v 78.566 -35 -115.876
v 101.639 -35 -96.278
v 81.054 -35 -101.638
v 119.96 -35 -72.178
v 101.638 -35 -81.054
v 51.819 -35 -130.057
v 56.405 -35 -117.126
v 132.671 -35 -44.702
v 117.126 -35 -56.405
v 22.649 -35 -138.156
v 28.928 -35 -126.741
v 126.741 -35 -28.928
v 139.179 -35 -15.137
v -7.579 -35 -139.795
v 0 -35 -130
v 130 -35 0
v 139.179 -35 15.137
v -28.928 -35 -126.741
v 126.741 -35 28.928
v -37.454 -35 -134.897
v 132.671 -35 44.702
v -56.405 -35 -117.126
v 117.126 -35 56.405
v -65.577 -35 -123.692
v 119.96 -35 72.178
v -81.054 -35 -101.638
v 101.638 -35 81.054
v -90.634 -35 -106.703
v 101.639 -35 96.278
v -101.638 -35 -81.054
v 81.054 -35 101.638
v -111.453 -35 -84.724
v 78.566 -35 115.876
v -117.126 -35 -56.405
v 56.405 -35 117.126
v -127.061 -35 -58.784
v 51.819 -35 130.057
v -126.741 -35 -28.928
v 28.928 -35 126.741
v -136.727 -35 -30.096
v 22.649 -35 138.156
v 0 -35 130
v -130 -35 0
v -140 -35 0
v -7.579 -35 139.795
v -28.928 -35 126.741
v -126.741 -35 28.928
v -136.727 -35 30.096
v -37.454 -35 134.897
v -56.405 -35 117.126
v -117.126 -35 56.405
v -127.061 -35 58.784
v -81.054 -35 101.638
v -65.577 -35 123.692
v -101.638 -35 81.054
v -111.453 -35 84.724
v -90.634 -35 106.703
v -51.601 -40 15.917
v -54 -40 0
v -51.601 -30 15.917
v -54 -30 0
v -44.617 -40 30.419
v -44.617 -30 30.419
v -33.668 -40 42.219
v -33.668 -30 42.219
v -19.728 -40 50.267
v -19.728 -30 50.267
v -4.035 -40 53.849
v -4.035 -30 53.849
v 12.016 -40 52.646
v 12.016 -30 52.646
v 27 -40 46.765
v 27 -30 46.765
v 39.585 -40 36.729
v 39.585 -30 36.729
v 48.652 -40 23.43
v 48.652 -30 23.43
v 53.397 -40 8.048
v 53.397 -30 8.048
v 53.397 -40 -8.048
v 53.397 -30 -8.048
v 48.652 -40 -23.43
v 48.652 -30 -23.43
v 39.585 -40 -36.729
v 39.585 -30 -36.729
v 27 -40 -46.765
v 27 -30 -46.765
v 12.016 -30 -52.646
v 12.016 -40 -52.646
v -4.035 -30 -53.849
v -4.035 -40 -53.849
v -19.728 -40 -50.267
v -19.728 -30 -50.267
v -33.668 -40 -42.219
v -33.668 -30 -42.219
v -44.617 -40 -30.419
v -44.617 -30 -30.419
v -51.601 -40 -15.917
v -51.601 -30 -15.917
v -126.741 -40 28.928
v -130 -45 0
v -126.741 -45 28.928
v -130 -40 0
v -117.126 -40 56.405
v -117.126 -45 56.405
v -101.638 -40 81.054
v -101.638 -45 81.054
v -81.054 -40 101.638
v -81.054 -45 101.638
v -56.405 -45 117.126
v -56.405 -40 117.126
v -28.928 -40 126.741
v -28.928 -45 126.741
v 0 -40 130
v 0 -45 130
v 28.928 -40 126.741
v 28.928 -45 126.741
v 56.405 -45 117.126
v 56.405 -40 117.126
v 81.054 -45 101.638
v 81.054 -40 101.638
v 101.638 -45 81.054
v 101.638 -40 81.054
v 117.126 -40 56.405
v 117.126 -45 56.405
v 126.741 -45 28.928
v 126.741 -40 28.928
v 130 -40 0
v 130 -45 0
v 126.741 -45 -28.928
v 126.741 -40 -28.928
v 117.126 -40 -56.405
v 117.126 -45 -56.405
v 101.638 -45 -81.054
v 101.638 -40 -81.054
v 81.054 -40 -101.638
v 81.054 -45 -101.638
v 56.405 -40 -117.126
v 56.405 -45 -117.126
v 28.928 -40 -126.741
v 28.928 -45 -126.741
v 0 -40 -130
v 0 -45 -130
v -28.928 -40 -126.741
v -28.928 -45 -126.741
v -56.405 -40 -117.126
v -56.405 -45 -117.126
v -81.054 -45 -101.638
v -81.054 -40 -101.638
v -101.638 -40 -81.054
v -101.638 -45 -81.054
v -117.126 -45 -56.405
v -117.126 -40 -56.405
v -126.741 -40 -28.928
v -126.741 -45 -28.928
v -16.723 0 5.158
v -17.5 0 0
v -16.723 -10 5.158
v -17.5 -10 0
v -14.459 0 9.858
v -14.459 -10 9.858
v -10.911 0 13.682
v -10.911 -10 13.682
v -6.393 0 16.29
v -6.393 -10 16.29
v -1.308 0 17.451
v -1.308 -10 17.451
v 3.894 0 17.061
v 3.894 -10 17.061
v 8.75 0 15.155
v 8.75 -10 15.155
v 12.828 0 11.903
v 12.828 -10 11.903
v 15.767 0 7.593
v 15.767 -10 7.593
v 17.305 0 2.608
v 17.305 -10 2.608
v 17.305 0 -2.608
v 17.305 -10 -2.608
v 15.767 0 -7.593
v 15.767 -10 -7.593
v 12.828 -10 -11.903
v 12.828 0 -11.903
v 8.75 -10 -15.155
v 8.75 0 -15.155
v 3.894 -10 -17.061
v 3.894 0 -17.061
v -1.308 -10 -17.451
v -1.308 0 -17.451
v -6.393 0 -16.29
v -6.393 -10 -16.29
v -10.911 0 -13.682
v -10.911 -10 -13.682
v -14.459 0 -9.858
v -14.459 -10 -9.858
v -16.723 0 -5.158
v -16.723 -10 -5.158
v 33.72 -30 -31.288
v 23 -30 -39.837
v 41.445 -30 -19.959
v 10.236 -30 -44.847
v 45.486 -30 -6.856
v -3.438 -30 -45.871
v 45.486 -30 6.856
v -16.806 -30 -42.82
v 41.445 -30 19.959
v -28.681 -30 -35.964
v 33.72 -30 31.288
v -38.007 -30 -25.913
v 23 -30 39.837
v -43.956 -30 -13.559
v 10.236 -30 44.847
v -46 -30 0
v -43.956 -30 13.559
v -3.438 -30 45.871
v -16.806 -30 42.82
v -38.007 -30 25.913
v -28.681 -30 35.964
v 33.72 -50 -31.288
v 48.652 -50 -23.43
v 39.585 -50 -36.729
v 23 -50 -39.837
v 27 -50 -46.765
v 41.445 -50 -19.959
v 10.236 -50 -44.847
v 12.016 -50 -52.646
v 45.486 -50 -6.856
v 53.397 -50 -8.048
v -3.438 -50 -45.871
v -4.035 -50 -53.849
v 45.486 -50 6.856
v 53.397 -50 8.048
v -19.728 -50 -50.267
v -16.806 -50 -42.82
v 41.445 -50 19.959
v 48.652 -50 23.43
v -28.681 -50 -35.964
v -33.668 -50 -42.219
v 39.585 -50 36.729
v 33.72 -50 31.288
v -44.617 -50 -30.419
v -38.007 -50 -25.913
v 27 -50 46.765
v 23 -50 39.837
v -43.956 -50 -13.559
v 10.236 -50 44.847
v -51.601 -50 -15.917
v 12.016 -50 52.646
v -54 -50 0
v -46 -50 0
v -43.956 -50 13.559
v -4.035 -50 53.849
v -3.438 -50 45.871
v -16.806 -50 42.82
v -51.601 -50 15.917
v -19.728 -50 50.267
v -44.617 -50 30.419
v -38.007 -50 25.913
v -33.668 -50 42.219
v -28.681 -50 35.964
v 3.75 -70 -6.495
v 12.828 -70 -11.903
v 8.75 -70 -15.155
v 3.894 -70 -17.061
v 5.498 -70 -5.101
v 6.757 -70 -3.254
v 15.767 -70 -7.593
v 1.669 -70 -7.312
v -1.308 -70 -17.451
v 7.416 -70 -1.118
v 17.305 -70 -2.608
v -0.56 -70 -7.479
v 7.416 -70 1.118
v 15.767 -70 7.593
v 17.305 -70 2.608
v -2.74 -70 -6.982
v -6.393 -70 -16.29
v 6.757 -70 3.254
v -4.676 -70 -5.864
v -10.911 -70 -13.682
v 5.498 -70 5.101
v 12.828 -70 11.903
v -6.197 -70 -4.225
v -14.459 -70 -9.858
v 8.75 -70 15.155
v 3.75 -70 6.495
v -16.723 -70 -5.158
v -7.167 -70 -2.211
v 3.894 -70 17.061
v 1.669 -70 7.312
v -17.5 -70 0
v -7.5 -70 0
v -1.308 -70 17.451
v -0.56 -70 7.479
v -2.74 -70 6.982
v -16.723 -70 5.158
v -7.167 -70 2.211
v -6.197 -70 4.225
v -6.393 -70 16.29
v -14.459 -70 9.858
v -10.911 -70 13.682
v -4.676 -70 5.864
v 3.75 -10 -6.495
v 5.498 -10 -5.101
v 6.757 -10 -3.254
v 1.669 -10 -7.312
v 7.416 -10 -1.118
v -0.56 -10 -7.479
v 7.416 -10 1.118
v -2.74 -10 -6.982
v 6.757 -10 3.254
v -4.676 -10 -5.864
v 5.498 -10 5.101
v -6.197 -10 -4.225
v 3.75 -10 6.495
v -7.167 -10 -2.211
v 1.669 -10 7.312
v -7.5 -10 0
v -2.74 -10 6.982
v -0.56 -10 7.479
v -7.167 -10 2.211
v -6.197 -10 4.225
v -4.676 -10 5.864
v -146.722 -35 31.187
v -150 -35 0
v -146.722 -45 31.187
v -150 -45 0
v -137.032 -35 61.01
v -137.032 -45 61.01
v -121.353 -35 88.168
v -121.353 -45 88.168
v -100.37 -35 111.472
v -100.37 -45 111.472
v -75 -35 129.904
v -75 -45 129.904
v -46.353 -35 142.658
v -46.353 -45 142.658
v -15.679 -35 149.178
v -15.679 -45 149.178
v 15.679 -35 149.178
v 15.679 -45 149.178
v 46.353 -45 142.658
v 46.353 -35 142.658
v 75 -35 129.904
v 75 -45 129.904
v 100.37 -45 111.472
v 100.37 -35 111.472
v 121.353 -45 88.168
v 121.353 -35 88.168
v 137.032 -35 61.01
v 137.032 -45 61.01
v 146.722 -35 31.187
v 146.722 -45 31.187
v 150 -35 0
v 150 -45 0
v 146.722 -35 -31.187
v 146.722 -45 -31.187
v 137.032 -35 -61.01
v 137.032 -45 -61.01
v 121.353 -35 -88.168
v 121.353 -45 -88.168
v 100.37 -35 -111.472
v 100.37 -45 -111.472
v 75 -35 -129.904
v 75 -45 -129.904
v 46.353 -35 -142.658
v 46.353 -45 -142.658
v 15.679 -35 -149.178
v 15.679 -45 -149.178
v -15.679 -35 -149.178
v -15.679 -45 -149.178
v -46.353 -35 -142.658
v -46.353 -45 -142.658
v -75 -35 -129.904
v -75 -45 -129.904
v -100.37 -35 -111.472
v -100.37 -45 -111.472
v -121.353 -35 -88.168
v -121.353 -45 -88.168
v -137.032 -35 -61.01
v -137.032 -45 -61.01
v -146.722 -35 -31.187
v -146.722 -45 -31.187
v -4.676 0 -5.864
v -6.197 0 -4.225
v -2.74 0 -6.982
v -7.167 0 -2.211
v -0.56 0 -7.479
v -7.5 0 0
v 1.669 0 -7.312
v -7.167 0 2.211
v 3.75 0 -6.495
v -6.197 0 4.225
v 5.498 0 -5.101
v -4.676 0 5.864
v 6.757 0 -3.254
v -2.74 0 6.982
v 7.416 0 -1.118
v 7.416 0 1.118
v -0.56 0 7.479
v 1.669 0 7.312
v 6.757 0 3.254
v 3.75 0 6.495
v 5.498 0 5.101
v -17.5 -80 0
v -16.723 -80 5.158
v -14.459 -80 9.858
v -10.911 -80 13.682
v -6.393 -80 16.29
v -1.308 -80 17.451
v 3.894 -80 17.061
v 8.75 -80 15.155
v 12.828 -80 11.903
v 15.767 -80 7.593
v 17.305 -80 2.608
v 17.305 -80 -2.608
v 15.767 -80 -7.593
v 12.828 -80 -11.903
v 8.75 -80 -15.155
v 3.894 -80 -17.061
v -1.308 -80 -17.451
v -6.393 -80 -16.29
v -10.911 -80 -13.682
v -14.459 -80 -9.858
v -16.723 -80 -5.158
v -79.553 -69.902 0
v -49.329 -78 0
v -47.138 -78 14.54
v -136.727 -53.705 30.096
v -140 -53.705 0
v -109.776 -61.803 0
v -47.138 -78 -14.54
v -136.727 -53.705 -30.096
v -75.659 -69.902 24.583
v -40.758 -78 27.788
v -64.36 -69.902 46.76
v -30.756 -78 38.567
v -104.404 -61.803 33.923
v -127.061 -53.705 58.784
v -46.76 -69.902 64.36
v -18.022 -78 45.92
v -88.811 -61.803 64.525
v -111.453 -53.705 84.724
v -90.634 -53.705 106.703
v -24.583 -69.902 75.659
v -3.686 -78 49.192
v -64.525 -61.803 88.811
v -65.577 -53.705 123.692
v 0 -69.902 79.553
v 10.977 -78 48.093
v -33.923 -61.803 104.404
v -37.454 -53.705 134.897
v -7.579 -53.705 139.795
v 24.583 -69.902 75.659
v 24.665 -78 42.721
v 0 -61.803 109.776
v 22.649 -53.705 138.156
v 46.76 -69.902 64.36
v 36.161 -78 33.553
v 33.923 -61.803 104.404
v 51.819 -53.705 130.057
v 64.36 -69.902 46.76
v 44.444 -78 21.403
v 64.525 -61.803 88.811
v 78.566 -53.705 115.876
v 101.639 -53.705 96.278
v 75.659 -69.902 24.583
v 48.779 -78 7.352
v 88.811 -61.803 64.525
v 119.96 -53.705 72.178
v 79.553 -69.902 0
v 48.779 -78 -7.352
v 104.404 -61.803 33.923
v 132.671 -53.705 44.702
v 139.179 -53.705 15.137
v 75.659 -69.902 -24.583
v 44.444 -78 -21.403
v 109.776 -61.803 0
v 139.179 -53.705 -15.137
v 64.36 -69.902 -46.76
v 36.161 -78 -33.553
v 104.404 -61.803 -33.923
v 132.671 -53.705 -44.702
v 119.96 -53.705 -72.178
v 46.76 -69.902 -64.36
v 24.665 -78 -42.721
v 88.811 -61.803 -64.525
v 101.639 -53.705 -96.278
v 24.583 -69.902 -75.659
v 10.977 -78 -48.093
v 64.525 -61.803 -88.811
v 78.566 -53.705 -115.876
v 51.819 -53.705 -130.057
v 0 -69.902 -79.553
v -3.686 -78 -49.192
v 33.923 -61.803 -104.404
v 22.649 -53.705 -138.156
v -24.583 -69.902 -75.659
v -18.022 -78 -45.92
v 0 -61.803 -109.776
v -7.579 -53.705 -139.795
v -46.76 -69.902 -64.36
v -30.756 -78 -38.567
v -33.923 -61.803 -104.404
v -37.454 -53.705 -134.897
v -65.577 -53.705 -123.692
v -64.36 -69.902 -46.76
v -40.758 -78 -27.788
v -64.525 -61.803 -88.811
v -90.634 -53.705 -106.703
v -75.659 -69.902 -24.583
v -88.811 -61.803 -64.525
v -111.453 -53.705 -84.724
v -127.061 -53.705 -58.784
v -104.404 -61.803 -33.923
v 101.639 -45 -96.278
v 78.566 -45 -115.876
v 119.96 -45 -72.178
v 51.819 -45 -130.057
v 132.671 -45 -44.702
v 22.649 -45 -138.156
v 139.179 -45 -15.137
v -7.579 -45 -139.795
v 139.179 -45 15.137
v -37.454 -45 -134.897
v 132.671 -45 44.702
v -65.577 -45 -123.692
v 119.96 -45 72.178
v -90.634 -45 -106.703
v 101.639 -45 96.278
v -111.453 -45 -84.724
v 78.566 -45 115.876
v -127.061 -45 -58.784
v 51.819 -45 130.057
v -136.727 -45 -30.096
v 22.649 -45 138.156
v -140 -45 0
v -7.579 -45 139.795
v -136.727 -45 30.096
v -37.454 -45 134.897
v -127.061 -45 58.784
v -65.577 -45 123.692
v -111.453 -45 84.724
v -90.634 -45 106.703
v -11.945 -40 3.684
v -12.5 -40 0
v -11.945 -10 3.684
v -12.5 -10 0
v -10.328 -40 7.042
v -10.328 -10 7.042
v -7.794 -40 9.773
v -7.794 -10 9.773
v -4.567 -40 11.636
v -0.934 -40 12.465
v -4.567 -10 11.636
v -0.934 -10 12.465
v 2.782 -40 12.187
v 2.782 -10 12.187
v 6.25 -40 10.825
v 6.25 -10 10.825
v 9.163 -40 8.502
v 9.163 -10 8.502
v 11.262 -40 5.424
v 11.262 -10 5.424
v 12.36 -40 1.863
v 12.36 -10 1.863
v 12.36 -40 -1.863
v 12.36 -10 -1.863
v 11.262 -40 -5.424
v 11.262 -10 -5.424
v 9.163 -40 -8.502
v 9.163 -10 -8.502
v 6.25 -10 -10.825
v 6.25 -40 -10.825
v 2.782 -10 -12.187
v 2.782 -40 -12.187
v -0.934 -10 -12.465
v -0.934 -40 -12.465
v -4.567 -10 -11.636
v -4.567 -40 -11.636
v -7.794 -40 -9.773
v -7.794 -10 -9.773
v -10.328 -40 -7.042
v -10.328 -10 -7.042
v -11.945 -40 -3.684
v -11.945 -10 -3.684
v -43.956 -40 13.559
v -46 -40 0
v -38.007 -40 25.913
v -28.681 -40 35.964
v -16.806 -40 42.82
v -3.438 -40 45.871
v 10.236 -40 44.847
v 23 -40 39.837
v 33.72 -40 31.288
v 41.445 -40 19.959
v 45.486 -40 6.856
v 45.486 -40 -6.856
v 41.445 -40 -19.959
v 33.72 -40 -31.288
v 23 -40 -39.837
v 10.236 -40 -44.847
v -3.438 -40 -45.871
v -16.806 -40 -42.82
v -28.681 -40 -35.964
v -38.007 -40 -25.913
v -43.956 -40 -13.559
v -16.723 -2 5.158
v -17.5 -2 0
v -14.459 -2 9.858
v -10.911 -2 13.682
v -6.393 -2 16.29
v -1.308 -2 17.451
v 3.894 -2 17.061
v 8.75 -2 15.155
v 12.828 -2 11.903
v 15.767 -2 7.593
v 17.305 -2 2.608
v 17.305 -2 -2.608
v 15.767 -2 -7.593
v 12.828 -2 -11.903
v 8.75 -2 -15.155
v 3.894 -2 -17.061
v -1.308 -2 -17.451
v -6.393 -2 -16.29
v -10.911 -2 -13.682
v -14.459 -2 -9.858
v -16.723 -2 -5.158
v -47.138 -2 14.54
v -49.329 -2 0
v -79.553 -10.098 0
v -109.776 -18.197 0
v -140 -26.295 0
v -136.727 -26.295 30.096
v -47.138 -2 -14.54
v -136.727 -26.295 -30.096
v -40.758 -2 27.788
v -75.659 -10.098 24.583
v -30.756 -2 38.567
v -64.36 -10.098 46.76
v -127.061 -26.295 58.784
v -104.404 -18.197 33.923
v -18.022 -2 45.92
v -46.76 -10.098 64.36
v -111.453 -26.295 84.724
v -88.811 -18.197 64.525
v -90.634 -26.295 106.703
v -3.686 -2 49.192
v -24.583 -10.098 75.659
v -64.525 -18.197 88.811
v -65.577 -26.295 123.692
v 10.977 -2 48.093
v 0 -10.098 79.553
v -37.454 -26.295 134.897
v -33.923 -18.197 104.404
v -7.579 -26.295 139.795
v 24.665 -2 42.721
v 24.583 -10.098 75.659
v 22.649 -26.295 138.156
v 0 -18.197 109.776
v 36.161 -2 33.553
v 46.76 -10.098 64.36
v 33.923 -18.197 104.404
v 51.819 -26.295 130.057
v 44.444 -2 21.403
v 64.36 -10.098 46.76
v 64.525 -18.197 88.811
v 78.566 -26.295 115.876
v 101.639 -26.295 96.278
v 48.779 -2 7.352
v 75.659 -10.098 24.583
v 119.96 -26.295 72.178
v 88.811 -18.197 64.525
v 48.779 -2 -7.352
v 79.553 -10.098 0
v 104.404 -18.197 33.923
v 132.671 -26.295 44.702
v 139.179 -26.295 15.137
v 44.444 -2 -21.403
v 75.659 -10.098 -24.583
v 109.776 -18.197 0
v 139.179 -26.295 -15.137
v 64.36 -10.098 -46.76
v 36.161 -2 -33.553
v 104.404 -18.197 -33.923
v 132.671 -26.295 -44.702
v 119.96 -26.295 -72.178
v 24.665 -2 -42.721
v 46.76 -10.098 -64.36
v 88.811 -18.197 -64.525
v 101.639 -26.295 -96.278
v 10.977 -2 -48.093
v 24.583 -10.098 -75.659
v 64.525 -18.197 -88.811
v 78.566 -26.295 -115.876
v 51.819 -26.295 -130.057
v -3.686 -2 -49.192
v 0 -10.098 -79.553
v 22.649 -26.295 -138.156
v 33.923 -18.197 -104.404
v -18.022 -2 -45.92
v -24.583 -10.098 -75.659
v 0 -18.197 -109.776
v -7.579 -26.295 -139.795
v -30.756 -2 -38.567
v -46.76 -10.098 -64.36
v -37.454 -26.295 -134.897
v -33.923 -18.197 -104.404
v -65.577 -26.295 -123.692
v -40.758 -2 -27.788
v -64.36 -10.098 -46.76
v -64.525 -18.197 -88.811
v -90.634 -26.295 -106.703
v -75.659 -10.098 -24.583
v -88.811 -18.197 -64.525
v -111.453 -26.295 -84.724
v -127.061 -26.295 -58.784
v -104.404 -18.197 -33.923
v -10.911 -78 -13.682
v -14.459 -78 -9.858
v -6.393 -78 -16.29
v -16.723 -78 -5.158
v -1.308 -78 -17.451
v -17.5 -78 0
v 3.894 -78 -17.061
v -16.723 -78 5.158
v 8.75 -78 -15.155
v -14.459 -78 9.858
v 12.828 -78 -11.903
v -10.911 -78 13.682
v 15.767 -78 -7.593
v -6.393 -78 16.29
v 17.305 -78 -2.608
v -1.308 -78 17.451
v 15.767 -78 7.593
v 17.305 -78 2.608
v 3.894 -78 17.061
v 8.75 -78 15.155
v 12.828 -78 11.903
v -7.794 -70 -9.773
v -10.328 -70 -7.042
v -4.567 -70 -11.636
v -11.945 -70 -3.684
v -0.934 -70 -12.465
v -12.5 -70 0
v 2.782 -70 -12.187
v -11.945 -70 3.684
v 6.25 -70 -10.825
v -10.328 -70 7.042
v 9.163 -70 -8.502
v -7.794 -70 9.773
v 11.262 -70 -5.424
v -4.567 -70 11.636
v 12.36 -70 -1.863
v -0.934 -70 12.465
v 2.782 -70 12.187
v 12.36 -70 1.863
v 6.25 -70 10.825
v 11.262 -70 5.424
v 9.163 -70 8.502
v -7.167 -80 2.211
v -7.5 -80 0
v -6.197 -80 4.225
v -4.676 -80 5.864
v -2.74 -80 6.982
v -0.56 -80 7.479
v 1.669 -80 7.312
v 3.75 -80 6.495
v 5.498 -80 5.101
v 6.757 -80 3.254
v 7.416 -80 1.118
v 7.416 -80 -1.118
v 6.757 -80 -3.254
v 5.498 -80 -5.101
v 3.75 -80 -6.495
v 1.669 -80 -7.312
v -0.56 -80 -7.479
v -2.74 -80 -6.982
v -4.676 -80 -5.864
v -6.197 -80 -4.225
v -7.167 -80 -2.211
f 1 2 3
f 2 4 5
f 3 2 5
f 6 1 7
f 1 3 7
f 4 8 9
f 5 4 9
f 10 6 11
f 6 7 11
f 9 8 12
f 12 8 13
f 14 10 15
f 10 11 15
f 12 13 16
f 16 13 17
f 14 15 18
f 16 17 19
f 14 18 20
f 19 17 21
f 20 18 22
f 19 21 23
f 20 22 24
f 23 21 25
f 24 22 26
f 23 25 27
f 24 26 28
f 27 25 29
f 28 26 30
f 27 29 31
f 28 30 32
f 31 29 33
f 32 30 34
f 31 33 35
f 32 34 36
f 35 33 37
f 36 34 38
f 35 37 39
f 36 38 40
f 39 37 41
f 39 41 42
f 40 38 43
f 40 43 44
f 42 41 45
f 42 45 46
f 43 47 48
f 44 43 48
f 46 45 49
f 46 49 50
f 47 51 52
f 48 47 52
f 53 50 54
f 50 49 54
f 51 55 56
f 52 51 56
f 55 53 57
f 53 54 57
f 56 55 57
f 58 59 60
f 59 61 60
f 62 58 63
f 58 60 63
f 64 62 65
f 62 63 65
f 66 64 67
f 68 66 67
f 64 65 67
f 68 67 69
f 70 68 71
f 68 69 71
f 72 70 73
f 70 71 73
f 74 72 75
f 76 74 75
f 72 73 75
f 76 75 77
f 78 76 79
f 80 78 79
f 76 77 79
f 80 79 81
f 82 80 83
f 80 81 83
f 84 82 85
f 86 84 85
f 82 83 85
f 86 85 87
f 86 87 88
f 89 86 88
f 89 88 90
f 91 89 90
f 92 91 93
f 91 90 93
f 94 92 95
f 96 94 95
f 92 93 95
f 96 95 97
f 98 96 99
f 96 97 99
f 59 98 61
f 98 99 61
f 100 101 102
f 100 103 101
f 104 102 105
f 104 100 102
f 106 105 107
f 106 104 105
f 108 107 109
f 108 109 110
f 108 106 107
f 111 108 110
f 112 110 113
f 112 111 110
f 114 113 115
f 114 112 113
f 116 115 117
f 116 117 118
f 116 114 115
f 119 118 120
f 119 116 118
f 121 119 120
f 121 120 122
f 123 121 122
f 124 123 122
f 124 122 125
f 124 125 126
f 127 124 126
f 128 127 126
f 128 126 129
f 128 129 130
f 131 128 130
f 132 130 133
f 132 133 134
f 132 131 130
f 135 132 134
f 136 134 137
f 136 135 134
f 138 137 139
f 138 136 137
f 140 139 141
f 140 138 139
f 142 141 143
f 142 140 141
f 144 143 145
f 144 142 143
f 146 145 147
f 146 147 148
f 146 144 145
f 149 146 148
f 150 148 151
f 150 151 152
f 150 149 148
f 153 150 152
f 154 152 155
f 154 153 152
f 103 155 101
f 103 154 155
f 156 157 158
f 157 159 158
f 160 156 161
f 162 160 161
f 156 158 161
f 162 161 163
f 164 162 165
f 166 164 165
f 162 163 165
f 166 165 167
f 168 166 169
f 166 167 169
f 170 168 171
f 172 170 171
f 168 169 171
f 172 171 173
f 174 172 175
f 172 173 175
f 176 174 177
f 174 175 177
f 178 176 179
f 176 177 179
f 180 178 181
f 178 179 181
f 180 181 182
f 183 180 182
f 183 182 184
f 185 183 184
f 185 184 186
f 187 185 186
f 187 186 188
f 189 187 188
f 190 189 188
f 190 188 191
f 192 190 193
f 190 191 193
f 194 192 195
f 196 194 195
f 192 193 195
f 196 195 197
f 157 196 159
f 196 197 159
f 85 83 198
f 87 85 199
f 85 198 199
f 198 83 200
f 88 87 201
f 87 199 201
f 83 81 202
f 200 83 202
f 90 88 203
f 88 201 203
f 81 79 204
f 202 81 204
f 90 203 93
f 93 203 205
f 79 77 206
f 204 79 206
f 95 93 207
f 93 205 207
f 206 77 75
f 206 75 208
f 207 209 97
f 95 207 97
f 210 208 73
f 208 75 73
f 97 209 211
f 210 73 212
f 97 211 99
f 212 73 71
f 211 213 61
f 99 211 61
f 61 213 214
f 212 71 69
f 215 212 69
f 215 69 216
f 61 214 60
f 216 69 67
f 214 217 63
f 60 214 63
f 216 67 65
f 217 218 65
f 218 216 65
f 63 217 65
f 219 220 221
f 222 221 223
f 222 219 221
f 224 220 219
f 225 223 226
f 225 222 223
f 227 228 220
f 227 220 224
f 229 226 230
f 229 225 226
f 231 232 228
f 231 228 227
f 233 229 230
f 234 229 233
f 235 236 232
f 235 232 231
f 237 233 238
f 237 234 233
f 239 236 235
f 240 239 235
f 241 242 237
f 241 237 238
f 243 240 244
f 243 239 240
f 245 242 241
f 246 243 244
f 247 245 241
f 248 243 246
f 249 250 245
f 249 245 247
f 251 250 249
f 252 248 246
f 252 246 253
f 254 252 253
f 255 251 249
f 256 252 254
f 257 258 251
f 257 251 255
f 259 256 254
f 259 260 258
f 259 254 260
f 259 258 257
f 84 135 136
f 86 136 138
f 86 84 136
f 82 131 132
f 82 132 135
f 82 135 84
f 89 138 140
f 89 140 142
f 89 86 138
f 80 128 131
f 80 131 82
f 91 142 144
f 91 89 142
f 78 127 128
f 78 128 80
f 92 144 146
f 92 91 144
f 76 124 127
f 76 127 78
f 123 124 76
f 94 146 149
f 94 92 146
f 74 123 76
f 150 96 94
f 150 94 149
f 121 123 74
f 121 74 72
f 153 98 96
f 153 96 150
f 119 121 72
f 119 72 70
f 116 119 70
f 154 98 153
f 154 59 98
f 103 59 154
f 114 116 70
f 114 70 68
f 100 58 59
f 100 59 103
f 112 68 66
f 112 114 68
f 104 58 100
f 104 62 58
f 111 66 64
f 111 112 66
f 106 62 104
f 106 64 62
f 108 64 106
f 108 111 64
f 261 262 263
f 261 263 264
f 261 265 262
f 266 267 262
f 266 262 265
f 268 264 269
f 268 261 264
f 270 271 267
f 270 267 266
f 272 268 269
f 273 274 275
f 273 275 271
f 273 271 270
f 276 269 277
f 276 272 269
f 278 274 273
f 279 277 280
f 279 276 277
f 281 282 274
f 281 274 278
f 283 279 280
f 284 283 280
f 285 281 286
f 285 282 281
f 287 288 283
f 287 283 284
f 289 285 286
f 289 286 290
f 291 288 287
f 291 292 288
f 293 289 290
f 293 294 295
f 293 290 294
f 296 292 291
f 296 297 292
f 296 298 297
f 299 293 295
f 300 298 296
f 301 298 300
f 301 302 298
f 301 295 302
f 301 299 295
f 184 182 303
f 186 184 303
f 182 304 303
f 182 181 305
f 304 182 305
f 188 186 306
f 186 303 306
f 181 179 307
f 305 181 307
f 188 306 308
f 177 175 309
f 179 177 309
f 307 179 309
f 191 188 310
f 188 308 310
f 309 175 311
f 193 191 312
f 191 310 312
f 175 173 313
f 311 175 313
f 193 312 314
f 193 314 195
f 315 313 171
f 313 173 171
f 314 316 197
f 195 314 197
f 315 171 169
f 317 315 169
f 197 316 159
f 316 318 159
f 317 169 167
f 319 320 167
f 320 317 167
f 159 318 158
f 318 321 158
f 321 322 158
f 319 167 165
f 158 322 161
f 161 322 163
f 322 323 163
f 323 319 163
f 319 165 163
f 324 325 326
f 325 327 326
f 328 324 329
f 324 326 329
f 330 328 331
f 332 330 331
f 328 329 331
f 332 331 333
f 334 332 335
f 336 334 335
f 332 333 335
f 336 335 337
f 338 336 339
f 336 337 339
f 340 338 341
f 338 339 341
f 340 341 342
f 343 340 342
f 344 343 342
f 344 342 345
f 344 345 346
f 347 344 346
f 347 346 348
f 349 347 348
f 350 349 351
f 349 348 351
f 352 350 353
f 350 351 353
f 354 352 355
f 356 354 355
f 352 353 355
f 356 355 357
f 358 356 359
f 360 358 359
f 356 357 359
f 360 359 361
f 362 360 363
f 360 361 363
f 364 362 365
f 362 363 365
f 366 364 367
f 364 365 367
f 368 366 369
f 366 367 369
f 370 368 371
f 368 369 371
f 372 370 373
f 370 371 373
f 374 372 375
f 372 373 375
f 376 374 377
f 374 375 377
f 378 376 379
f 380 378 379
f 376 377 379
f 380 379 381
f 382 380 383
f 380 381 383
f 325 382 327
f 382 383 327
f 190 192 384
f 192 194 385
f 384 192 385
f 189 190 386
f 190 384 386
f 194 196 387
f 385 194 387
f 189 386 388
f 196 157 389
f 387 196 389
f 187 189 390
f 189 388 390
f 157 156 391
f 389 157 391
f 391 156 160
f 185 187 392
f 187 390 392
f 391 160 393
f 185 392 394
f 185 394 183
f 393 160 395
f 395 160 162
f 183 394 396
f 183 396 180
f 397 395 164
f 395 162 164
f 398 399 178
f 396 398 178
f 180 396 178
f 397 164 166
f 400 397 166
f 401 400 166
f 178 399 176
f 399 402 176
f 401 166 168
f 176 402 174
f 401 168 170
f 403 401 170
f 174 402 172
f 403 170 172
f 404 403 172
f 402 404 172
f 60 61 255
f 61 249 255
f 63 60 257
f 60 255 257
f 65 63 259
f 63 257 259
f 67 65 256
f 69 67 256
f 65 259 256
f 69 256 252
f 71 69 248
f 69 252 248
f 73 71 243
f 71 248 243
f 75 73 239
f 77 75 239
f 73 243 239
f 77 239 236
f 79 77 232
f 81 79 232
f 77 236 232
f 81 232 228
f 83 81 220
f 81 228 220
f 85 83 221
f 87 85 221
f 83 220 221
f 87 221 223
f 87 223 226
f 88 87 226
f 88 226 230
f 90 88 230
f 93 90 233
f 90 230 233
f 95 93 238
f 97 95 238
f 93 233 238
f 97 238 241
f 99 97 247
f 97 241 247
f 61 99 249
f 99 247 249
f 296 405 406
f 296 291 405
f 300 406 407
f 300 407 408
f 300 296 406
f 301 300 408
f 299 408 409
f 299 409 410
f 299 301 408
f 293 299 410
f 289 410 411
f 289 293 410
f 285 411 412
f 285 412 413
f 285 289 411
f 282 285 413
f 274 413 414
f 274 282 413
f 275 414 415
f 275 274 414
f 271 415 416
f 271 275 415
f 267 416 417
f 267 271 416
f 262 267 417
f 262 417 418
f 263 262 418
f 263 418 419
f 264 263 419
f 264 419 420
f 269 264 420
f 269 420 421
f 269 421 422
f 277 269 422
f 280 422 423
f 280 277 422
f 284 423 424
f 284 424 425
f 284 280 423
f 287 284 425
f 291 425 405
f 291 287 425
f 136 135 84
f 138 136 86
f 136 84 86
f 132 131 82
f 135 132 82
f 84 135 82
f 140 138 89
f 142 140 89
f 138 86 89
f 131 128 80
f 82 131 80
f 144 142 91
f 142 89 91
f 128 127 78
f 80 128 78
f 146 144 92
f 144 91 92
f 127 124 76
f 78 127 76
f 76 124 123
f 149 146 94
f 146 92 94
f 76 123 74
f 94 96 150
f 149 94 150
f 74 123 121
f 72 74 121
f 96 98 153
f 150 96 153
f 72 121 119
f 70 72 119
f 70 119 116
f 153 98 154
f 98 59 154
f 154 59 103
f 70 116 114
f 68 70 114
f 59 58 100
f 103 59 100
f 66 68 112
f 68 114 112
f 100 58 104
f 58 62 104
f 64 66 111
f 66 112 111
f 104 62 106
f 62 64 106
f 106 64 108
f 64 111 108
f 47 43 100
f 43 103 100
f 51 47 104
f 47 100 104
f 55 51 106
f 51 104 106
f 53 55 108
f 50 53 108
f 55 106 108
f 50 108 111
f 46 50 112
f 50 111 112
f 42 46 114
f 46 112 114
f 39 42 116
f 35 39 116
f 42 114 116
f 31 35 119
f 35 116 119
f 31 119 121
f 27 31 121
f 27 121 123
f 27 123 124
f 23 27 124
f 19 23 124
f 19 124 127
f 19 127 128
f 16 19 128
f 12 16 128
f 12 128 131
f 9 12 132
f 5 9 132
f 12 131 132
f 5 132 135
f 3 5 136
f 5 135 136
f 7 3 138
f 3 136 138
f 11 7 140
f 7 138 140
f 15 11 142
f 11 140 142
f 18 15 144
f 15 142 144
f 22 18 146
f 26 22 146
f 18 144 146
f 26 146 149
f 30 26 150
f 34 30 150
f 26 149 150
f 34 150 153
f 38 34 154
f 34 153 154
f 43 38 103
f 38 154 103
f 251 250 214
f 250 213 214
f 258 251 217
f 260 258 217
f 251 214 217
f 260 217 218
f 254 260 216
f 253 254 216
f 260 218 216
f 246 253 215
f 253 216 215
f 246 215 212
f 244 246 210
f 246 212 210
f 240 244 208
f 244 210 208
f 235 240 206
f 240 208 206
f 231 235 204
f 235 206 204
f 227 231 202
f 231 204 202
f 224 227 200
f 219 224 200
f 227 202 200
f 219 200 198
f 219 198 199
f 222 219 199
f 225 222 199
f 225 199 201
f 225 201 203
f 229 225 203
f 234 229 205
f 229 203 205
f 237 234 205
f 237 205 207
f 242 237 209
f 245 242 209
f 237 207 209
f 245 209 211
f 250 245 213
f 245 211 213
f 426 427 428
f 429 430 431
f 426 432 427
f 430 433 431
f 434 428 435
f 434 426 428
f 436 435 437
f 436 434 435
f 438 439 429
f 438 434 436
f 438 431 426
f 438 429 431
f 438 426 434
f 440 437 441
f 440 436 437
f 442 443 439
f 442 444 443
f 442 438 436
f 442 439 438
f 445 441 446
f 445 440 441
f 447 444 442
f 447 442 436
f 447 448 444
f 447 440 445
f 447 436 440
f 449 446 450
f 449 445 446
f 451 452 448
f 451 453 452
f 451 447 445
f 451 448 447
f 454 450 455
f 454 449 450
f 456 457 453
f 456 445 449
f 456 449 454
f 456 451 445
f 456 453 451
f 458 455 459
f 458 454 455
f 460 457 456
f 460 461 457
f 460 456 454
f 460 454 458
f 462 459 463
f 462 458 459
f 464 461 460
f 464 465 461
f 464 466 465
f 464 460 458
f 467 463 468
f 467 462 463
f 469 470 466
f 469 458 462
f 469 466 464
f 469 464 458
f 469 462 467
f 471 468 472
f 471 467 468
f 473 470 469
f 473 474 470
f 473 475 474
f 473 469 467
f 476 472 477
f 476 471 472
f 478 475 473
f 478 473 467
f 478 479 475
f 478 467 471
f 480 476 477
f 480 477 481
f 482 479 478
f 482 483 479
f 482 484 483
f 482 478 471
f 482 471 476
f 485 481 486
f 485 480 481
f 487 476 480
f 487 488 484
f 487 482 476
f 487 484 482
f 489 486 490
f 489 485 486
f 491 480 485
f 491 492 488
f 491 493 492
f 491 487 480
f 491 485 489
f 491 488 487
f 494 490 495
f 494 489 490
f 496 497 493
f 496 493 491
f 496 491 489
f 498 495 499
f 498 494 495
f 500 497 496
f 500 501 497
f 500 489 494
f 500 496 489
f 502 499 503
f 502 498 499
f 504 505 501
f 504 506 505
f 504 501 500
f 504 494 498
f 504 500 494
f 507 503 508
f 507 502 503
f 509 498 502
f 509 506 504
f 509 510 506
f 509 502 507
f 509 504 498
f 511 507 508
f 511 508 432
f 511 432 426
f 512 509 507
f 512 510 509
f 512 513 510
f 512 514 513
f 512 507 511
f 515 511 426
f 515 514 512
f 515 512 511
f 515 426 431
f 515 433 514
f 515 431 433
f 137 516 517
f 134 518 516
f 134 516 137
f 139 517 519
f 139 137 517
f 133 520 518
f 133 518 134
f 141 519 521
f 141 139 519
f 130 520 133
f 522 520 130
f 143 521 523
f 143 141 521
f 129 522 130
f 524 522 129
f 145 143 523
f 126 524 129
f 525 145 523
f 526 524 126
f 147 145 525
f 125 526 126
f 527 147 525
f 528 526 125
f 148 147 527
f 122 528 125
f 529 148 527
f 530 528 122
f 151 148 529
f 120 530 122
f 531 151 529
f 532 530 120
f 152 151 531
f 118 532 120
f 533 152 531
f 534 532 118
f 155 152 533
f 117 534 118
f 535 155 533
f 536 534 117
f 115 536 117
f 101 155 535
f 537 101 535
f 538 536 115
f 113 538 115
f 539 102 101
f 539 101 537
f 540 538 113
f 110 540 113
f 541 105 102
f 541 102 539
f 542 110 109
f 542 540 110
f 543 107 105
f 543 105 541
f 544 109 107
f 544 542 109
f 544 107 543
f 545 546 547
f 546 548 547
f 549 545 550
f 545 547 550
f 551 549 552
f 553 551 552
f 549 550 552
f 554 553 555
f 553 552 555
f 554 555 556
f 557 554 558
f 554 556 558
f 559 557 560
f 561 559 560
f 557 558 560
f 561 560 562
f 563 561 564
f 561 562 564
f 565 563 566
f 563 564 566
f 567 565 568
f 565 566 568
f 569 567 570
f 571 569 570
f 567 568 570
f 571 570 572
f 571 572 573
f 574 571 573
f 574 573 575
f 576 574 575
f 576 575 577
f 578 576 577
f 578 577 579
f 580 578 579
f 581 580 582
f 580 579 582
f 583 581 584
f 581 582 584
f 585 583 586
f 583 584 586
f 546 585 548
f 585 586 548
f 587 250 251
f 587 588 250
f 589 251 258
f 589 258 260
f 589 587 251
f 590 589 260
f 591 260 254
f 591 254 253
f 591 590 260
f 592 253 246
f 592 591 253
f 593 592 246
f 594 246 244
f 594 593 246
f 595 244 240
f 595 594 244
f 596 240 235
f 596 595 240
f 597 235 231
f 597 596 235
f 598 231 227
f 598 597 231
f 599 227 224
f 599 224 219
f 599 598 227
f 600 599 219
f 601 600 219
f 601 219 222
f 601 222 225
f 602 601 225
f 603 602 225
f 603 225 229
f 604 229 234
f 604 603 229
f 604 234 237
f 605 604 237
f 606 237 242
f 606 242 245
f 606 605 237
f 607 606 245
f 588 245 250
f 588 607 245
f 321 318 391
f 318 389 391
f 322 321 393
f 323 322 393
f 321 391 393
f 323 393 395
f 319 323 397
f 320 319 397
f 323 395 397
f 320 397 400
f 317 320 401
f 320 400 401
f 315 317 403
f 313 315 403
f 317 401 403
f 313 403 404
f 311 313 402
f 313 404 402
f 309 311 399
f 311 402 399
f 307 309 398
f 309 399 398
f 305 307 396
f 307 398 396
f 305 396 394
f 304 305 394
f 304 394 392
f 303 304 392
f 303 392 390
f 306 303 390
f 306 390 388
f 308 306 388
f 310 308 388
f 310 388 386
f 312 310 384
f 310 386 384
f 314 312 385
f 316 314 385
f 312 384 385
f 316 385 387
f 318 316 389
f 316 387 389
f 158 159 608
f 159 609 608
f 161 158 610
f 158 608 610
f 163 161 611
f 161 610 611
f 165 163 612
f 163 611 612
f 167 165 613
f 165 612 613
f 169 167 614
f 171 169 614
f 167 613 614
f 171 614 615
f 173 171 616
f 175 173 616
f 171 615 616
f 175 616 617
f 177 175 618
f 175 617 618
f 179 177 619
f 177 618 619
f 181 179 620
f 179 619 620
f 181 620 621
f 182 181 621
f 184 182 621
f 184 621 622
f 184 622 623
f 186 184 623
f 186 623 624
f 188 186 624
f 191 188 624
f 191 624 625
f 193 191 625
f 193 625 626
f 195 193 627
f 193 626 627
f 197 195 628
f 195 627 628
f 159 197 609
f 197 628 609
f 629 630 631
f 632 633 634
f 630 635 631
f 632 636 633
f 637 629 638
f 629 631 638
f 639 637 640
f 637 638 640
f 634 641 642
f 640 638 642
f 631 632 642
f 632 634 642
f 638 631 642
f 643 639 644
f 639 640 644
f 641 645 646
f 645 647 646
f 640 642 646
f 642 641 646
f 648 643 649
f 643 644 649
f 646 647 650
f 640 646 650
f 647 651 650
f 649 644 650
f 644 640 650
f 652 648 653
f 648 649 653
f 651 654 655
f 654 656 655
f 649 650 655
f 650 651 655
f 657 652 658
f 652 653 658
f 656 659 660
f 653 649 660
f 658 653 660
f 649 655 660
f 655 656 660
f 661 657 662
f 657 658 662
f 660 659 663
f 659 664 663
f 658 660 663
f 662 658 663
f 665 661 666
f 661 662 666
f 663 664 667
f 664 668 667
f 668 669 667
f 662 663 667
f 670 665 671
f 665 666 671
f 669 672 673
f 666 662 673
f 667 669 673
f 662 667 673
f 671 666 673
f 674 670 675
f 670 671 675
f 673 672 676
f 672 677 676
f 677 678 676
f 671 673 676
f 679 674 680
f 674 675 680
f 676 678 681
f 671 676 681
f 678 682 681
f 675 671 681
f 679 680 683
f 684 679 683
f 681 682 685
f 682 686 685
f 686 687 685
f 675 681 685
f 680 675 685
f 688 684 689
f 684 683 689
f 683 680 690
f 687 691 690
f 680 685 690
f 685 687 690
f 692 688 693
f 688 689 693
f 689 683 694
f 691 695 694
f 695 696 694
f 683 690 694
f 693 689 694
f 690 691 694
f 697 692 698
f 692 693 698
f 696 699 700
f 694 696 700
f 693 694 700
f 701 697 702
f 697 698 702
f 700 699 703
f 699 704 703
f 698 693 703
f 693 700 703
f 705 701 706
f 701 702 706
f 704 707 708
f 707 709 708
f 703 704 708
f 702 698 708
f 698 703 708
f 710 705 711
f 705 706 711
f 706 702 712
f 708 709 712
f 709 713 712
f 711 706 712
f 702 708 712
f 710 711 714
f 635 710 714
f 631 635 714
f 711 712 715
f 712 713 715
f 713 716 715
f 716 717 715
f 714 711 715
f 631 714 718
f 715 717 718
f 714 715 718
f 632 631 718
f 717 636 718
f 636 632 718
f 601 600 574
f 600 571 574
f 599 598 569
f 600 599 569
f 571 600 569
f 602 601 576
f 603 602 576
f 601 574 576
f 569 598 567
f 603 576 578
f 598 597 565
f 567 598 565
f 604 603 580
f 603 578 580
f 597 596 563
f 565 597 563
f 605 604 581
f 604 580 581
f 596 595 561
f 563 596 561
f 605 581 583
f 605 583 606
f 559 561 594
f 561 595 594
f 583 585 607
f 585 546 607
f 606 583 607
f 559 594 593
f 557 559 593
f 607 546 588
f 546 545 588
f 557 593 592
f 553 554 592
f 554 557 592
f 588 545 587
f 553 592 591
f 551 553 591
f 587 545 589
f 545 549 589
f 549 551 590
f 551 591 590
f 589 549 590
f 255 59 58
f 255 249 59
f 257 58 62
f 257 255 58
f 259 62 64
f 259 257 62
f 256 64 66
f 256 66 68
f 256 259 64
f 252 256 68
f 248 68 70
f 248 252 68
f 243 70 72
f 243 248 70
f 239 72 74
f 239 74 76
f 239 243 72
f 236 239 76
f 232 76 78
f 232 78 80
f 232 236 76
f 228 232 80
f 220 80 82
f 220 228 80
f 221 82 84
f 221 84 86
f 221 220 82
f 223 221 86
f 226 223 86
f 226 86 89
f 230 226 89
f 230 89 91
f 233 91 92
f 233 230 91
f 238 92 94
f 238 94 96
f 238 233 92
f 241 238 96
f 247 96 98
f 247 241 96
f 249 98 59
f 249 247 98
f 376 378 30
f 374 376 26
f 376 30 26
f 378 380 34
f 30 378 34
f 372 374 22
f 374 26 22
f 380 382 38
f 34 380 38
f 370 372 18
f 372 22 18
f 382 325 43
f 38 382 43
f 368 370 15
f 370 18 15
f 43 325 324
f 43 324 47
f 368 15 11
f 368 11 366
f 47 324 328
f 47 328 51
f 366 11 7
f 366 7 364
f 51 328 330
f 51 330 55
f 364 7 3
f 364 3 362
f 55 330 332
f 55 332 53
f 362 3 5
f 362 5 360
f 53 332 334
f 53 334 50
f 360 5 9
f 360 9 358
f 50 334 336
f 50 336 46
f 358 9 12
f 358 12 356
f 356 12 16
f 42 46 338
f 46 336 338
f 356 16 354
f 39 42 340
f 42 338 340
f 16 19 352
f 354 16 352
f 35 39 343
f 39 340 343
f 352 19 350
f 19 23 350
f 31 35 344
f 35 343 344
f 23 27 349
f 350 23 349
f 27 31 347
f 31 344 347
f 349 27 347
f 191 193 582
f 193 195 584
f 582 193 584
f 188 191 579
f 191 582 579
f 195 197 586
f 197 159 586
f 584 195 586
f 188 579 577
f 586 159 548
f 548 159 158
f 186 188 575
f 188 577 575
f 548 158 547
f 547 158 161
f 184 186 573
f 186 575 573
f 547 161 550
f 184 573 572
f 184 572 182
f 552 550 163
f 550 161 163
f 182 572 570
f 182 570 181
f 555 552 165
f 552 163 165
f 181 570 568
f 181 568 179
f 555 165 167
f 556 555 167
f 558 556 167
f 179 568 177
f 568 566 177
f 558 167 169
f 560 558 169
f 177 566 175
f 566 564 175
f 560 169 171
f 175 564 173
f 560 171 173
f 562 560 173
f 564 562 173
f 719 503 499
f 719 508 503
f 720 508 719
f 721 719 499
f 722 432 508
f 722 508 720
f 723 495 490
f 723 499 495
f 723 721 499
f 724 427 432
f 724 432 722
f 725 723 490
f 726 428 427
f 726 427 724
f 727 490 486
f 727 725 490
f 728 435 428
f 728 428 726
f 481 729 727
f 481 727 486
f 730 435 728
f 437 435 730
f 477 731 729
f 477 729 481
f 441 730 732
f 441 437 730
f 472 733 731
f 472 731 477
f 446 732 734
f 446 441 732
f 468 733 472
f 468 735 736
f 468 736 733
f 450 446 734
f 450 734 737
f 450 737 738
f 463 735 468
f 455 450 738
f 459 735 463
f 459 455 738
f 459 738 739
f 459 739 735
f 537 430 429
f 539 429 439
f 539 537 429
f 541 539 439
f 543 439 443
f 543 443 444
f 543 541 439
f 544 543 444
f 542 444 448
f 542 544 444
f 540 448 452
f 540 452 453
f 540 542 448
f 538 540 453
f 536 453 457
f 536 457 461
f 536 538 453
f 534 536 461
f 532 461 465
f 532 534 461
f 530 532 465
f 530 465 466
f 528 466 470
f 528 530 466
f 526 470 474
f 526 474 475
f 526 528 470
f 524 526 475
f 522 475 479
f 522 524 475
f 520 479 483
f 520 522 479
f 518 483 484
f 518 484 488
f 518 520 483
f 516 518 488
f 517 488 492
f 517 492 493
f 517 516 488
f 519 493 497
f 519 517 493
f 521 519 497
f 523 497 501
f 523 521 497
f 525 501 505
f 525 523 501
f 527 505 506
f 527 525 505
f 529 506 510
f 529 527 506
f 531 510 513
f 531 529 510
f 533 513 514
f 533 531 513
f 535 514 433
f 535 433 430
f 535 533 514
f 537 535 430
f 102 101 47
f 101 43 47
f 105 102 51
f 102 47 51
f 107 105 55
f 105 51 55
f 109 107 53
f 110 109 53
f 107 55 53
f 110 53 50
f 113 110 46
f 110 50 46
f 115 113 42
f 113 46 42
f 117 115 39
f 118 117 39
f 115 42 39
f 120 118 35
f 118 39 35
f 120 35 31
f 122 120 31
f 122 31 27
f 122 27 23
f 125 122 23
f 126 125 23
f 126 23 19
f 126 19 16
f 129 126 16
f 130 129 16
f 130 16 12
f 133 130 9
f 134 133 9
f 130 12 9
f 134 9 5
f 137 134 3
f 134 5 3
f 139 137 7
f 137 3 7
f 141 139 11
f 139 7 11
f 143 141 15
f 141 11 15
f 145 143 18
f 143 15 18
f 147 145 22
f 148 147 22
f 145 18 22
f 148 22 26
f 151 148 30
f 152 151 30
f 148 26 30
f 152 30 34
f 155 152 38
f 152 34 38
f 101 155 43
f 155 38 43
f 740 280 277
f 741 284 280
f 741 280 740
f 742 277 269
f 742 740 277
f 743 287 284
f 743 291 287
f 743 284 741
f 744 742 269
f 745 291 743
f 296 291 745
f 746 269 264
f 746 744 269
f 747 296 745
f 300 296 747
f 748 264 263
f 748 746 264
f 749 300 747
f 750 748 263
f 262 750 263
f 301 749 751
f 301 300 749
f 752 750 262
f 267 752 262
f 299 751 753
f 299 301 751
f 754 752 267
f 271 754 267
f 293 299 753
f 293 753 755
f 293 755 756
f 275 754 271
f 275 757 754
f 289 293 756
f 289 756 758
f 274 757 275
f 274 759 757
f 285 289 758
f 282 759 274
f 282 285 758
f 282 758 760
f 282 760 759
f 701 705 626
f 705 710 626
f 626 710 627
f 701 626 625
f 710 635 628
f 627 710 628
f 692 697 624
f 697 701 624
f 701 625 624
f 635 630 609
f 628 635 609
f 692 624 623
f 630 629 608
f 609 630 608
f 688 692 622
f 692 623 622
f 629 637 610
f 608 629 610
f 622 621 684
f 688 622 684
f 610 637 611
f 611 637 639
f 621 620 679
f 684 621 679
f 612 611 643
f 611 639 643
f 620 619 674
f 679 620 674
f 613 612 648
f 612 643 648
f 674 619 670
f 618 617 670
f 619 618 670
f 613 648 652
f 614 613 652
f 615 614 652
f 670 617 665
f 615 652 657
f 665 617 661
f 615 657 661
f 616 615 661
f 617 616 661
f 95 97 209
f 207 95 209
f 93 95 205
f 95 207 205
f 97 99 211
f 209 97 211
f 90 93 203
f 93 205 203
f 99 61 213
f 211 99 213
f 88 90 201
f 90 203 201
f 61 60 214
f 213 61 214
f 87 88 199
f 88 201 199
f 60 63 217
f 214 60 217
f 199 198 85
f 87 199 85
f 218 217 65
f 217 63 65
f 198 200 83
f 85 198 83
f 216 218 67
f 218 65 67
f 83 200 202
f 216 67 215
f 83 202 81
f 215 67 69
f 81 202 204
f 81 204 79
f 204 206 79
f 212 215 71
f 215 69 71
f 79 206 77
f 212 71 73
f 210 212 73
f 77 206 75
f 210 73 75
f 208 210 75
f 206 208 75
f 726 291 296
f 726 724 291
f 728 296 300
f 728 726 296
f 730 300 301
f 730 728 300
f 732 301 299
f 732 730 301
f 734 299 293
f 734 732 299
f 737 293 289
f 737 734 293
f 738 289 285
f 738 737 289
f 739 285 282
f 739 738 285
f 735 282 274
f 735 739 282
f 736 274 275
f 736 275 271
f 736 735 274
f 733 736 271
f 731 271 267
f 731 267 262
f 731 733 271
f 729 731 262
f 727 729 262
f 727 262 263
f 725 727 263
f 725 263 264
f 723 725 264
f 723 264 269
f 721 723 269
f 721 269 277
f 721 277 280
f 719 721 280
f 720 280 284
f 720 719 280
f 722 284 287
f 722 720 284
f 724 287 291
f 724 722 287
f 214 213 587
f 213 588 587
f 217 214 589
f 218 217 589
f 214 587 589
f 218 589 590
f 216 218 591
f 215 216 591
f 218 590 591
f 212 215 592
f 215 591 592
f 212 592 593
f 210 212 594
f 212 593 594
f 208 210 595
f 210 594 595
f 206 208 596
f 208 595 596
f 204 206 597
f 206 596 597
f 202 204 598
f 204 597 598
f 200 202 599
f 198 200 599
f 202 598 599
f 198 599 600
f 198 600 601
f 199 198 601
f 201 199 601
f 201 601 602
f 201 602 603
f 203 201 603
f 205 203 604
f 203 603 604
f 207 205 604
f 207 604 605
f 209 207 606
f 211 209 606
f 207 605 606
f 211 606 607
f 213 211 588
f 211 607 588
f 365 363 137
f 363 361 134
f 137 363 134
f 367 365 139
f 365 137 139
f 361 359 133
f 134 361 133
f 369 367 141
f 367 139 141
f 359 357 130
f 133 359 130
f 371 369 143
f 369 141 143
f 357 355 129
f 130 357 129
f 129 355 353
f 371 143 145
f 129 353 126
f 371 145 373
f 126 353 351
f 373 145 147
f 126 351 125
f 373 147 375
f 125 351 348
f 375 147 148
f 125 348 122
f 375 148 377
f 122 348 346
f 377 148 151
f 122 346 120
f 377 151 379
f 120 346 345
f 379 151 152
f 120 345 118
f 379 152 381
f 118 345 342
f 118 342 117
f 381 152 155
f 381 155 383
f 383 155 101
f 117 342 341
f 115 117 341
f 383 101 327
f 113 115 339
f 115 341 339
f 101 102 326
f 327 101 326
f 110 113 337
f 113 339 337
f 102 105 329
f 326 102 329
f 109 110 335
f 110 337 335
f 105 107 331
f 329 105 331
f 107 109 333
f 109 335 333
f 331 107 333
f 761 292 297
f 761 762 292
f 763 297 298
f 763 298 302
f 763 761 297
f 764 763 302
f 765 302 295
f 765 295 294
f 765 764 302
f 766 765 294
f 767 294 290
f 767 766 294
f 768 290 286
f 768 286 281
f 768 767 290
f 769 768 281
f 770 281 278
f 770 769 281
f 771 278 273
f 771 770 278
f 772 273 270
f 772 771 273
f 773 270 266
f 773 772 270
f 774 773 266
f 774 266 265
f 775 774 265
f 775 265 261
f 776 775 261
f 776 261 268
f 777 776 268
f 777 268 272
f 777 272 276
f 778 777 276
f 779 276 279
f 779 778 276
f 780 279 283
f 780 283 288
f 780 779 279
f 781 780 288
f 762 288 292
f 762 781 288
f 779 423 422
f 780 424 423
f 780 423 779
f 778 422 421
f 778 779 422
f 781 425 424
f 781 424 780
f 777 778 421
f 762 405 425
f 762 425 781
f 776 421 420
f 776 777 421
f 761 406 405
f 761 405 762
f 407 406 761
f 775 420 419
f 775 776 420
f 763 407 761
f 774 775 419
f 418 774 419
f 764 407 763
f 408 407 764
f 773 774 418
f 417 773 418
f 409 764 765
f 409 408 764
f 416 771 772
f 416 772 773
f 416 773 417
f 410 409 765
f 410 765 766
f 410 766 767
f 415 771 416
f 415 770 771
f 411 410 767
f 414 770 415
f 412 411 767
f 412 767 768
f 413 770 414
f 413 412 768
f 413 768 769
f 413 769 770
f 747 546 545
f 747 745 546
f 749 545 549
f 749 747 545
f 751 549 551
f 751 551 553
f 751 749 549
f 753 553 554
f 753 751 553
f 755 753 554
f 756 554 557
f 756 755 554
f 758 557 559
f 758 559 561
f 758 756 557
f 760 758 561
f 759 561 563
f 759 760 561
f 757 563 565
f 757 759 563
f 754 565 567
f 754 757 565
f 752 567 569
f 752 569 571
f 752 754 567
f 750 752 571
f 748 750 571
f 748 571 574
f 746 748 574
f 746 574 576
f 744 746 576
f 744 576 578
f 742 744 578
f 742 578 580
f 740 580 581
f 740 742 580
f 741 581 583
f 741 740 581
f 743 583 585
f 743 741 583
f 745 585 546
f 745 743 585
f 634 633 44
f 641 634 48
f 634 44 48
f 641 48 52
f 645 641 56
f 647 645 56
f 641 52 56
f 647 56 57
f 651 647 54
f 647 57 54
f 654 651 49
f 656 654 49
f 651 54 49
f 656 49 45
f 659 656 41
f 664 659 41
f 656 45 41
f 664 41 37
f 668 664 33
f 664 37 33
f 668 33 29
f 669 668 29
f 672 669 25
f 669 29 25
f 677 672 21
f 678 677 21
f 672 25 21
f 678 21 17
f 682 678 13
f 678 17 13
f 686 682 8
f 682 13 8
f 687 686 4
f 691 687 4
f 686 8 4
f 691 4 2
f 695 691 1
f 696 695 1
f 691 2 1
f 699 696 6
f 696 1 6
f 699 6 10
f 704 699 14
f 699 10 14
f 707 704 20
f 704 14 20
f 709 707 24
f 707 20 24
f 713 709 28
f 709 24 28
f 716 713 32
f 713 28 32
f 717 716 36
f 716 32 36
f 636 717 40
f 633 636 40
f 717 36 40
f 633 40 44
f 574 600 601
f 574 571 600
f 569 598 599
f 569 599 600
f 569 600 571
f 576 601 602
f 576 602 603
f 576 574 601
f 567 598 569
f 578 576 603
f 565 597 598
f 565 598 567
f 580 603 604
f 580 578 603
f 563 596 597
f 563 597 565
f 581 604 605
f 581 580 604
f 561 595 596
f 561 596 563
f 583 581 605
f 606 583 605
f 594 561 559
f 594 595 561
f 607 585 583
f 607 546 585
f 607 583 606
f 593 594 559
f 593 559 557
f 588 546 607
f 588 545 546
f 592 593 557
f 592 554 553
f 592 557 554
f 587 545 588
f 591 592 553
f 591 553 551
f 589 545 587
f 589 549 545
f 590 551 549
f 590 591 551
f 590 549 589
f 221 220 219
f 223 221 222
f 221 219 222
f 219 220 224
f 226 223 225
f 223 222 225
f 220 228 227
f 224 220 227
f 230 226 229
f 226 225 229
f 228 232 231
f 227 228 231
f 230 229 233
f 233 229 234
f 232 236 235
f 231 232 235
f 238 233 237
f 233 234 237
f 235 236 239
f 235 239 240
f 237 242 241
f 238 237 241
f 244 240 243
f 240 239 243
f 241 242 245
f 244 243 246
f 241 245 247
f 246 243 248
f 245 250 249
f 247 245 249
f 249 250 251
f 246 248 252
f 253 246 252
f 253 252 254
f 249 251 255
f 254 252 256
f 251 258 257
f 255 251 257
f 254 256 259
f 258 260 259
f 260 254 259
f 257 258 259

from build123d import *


with BuildPart() as f1:
    # F0 (on Top) → F1 (revolve)
    with BuildSketch(Plane.XY):
        Polygon((-140, -26.295088), (-140, -35), (-130, -35), (-130, -40), (-54, -40), (-54, -30), (-46, -30), (-46, -40), (-12.5, -40), (-12.5, -10), (-17.5, -10), (-17.5, -2), (-49.329496, -2), align=None)
    revolve(axis=Axis((0, -27.422881, 0), (0, 1, 0)))


with BuildPart() as f2:
    # F0 (on Top) → F2 (revolve)
    with BuildSketch(Plane.XY):
        Polygon((-140, -35), (-150, -35), (-150, -45), (-130, -45), (-130, -40), (-130, -35), align=None)
    revolve(axis=Axis((0, -27.422881, 0), (0, 1, 0)))


with BuildPart() as f3:
    # F0 (on Top) → F3 (revolve)
    with BuildSketch(Plane.XY):
        Polygon((-17.5, 0), (-17.5, -2), (-17.5, -10), (-12.5, -10), (-7.5, -10), (-7.5, 0), align=None)
    revolve(axis=Axis((0, -27.422881, 0), (0, 1, 0)))


with BuildPart() as f5:
    # F0 (on Top) → F5 (revolve)
    with BuildSketch(Plane.XY):
        Polygon((-54, -30), (-54, -40), (-54, -50), (-46, -50), (-46, -40), (-46, -30), align=None)
    revolve(axis=Axis((0, -27.422881, 0), (0, 1, 0)))


with BuildPart() as f6_1:
    # F6: instance of F1
    add(f1.part.mirror(Plane.XZ.offset(40)))


with BuildPart() as f6_2:
    # F6: instance of F3
    add(f3.part.mirror(Plane.XZ.offset(40)))


solid = Compound([f1.part, f2.part, f3.part, f5.part, f6_1.part, f6_2.part])
